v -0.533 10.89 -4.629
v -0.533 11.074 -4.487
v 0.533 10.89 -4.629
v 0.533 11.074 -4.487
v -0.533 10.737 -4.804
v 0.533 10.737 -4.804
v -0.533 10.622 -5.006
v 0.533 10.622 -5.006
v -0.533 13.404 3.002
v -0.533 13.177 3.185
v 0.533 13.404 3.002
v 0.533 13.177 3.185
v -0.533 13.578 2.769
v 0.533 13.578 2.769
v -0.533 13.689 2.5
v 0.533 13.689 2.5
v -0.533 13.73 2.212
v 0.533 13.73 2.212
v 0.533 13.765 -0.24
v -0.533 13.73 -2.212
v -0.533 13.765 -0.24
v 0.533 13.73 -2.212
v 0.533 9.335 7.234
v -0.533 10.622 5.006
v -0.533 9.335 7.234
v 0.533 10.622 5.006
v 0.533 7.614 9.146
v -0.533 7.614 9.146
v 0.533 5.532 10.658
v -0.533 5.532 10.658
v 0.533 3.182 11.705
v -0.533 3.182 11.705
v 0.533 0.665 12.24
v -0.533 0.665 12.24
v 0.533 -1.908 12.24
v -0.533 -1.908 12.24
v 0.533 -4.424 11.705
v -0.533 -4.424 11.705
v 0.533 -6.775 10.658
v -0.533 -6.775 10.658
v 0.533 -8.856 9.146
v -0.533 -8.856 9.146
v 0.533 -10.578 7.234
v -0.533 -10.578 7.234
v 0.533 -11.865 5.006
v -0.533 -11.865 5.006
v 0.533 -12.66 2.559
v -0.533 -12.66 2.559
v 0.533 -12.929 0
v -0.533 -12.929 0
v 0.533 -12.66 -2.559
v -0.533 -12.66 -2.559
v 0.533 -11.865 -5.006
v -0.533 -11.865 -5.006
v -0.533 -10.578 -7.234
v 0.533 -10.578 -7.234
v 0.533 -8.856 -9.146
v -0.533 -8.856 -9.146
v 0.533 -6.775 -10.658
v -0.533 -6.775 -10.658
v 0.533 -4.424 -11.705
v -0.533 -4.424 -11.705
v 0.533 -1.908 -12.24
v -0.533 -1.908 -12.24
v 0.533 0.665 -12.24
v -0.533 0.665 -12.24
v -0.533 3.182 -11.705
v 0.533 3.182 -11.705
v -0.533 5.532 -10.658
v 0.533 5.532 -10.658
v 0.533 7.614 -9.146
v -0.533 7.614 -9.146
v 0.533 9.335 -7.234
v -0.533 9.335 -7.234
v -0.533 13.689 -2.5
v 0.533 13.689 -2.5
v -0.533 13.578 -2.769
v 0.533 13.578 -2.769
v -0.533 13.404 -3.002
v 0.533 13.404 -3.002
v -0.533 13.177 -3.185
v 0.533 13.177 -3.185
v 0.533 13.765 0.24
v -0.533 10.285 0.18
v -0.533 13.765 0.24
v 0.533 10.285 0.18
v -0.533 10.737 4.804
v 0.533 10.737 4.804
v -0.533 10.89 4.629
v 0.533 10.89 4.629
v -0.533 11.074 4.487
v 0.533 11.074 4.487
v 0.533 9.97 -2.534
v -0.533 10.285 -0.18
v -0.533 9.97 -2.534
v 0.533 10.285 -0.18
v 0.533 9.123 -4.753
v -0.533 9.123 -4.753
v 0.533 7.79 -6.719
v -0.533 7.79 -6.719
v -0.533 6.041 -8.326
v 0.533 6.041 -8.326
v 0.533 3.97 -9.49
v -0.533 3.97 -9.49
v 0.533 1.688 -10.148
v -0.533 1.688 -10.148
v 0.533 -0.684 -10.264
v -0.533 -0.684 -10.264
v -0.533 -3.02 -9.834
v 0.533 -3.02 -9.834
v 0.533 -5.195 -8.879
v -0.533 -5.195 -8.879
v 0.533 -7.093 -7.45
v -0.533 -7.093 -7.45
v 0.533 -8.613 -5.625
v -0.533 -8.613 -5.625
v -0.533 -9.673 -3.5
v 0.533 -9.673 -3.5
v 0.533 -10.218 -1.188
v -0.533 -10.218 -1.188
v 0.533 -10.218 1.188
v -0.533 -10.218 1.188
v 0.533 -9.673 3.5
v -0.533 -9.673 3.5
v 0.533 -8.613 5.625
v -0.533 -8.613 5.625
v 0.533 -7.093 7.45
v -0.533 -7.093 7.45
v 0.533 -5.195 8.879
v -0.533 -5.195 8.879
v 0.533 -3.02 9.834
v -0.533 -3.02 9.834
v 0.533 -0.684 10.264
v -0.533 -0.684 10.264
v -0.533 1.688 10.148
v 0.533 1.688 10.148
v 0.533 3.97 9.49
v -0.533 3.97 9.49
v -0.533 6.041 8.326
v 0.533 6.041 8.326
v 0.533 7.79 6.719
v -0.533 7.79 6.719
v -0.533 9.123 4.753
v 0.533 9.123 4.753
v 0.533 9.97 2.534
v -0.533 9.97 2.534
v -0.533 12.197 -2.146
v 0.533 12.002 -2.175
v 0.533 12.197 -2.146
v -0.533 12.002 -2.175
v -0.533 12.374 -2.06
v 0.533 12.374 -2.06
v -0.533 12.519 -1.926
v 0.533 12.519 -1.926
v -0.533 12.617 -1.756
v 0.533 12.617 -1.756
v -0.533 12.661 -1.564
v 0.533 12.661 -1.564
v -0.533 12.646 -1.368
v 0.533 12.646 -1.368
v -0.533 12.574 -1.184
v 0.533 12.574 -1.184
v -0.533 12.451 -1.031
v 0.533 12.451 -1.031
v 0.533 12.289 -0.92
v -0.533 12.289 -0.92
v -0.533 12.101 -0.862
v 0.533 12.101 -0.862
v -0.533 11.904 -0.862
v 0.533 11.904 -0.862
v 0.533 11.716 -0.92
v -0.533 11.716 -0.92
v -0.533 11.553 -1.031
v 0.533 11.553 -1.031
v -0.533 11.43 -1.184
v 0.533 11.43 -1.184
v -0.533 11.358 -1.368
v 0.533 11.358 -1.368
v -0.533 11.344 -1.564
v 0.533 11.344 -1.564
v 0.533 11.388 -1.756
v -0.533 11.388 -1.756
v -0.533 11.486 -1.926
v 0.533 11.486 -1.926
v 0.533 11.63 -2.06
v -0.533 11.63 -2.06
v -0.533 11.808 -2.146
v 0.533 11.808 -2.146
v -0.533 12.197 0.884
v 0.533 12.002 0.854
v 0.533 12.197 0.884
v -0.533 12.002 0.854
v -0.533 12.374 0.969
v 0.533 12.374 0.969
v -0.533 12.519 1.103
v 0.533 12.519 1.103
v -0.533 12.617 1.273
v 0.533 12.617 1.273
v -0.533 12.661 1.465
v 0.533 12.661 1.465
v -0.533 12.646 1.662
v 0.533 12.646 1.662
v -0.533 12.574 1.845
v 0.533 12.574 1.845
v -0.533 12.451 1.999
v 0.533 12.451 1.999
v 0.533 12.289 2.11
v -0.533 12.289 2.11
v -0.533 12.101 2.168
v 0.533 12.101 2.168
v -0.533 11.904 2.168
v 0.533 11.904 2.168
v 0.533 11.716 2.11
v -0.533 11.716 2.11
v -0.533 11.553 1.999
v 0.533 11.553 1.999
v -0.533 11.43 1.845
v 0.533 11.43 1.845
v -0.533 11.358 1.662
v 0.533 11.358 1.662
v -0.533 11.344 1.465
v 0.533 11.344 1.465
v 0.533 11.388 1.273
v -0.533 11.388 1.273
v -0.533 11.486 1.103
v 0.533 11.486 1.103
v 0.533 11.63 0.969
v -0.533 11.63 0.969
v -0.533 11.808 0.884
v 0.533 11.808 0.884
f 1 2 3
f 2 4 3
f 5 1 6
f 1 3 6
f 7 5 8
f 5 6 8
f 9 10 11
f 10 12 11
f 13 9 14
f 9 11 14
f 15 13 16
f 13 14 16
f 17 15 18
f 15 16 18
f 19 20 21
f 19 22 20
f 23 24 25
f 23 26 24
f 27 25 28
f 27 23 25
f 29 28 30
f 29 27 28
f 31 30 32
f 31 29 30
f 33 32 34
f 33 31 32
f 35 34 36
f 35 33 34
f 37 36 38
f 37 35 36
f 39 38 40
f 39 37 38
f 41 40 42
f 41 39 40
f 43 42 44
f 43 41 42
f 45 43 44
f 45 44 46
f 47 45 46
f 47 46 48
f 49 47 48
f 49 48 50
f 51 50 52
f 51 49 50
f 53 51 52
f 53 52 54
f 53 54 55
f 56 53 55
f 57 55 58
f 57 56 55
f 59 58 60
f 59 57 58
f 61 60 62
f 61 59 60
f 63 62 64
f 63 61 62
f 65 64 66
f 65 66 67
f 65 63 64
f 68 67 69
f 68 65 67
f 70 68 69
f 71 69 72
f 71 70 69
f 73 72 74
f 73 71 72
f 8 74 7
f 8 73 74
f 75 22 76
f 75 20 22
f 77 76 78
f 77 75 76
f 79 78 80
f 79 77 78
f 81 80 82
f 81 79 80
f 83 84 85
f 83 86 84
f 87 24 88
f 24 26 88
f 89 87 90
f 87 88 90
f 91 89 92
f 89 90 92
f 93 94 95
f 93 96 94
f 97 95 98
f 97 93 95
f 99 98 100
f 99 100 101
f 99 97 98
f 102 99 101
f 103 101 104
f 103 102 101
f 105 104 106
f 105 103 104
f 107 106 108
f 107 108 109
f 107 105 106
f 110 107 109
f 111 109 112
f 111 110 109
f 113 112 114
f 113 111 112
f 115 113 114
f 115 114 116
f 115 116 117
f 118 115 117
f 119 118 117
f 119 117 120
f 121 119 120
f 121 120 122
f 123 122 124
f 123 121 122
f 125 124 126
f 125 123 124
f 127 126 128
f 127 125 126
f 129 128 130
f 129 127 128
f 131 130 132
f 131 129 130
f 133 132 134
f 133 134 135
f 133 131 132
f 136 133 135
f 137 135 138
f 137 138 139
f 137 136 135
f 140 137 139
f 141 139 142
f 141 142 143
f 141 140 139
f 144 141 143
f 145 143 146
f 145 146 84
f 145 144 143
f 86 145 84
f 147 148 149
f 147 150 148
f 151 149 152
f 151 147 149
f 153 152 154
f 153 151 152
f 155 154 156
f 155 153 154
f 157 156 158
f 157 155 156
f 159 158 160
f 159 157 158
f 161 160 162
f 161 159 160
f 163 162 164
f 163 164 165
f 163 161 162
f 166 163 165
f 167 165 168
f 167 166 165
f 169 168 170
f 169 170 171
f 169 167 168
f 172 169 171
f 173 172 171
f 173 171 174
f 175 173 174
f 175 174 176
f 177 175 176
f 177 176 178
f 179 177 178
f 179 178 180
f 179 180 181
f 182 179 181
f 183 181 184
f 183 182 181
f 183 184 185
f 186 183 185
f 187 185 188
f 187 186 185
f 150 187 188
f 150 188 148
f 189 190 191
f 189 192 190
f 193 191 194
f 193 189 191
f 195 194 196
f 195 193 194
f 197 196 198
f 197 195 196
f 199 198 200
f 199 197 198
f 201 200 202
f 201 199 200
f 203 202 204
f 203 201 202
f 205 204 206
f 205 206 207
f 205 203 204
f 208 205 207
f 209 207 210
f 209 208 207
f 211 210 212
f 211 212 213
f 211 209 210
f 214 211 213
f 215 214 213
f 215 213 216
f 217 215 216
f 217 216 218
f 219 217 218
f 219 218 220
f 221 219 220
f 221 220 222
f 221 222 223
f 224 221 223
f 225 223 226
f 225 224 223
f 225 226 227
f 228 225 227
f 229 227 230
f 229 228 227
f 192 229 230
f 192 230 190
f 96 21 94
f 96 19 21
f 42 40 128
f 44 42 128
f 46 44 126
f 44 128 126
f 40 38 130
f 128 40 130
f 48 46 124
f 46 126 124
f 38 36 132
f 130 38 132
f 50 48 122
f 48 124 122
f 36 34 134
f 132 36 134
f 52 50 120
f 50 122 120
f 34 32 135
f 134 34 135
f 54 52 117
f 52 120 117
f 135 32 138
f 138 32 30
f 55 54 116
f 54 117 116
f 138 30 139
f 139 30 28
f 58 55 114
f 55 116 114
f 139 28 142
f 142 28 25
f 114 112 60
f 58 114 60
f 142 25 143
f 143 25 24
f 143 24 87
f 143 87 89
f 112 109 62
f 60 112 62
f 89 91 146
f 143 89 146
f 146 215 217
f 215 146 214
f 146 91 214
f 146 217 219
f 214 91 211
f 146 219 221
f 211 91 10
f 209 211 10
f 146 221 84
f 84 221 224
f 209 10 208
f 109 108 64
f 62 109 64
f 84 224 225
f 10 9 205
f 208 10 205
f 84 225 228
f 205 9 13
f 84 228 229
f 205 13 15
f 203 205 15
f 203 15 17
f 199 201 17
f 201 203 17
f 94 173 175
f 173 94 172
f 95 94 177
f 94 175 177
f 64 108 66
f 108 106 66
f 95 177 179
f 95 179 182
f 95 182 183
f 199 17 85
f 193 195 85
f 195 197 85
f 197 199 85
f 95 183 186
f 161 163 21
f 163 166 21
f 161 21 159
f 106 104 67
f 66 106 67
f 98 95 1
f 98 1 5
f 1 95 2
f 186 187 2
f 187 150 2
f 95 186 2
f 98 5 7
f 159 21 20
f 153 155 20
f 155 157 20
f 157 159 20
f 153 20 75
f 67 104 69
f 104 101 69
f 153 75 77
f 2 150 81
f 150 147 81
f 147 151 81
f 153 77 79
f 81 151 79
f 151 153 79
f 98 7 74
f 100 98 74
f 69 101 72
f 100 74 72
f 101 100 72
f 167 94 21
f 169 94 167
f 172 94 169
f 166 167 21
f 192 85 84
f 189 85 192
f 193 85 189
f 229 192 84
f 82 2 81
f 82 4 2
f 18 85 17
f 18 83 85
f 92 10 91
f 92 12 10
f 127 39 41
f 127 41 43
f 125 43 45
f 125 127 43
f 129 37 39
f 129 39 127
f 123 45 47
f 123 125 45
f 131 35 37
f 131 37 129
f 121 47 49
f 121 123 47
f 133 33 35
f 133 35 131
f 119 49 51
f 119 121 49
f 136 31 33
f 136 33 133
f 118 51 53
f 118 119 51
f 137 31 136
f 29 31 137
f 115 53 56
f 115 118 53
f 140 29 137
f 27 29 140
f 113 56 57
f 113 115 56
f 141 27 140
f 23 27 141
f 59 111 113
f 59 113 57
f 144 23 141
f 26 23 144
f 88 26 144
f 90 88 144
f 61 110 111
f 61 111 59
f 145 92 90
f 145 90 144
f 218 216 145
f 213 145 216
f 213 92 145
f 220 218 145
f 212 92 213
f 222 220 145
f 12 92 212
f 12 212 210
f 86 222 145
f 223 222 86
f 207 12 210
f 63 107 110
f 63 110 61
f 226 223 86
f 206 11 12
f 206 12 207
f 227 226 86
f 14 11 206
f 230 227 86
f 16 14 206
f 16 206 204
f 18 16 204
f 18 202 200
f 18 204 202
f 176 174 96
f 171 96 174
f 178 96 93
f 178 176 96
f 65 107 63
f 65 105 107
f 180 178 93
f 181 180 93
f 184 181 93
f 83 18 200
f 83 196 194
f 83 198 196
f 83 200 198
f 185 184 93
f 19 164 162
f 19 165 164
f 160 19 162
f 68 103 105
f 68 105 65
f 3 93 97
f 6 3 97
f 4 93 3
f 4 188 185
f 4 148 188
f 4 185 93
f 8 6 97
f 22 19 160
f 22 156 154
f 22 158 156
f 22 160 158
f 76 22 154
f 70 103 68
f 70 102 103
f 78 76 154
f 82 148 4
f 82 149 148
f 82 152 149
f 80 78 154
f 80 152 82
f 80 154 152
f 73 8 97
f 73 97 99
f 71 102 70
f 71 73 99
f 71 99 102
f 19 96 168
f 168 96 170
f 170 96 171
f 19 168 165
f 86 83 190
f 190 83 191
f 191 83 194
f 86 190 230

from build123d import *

# Parameters (mm, degrees)
SKETCH1_R      = 0.6604
EXTRUDE1_DEPTH = 0.5334
FILLET1_R      = 1.1684


with BuildPart() as part:
    # Sketch1 → Extrude1 (new body, symmetric)
    with BuildSketch(Plane(origin=(0, 0, 0), x_dir=(0, 0, -1), z_dir=(1, 0, 0))):
        with BuildLine():
            Line((-0.179532905, 10.28543324), (-0.240263789, 13.76470325))
            Line((-0.240263789, 13.76470325), (-2.849716296, 13.719155087))
            Line((-2.849716296, 13.719155087), (-4.681521945, 10.760524305))
            ThreePointArc((-4.681521945, 10.760524305), (0, -12.9286), (4.681521945, 10.760524305))
            Line((4.681521945, 10.760524305), (2.849716296, 13.719155087))
            Line((2.849716296, 13.719155087), (0.240263789, 13.76470325))
            Line((0.240263789, 13.76470325), (0.179532905, 10.28543324))
            ThreePointArc((0.179532905, 10.28543324), (0, -10.287), (-0.179532905, 10.28543324))
        make_face()
        with Locations((-1.514624601, 12.002294163)):
            Circle(SKETCH1_R, mode=Mode.SUBTRACT)
        with Locations((1.514624601, 12.002294163)):
            Circle(SKETCH1_R, mode=Mode.SUBTRACT)
    extrude(amount=EXTRUDE1_DEPTH, both=True)

    # Fillet1
    fillet1_edges = [part.edges().sort_by_distance(p)[0] for p in [
        (0, 13.719155087, -2.849716296),
        (0, 10.760524305, -4.681521945),
        (0, 10.760524305, 4.681521945),
        (0, 13.719155087, 2.849716296),
    ]]
    fillet(fillet1_edges, radius=FILLET1_R)


solid = part.part
